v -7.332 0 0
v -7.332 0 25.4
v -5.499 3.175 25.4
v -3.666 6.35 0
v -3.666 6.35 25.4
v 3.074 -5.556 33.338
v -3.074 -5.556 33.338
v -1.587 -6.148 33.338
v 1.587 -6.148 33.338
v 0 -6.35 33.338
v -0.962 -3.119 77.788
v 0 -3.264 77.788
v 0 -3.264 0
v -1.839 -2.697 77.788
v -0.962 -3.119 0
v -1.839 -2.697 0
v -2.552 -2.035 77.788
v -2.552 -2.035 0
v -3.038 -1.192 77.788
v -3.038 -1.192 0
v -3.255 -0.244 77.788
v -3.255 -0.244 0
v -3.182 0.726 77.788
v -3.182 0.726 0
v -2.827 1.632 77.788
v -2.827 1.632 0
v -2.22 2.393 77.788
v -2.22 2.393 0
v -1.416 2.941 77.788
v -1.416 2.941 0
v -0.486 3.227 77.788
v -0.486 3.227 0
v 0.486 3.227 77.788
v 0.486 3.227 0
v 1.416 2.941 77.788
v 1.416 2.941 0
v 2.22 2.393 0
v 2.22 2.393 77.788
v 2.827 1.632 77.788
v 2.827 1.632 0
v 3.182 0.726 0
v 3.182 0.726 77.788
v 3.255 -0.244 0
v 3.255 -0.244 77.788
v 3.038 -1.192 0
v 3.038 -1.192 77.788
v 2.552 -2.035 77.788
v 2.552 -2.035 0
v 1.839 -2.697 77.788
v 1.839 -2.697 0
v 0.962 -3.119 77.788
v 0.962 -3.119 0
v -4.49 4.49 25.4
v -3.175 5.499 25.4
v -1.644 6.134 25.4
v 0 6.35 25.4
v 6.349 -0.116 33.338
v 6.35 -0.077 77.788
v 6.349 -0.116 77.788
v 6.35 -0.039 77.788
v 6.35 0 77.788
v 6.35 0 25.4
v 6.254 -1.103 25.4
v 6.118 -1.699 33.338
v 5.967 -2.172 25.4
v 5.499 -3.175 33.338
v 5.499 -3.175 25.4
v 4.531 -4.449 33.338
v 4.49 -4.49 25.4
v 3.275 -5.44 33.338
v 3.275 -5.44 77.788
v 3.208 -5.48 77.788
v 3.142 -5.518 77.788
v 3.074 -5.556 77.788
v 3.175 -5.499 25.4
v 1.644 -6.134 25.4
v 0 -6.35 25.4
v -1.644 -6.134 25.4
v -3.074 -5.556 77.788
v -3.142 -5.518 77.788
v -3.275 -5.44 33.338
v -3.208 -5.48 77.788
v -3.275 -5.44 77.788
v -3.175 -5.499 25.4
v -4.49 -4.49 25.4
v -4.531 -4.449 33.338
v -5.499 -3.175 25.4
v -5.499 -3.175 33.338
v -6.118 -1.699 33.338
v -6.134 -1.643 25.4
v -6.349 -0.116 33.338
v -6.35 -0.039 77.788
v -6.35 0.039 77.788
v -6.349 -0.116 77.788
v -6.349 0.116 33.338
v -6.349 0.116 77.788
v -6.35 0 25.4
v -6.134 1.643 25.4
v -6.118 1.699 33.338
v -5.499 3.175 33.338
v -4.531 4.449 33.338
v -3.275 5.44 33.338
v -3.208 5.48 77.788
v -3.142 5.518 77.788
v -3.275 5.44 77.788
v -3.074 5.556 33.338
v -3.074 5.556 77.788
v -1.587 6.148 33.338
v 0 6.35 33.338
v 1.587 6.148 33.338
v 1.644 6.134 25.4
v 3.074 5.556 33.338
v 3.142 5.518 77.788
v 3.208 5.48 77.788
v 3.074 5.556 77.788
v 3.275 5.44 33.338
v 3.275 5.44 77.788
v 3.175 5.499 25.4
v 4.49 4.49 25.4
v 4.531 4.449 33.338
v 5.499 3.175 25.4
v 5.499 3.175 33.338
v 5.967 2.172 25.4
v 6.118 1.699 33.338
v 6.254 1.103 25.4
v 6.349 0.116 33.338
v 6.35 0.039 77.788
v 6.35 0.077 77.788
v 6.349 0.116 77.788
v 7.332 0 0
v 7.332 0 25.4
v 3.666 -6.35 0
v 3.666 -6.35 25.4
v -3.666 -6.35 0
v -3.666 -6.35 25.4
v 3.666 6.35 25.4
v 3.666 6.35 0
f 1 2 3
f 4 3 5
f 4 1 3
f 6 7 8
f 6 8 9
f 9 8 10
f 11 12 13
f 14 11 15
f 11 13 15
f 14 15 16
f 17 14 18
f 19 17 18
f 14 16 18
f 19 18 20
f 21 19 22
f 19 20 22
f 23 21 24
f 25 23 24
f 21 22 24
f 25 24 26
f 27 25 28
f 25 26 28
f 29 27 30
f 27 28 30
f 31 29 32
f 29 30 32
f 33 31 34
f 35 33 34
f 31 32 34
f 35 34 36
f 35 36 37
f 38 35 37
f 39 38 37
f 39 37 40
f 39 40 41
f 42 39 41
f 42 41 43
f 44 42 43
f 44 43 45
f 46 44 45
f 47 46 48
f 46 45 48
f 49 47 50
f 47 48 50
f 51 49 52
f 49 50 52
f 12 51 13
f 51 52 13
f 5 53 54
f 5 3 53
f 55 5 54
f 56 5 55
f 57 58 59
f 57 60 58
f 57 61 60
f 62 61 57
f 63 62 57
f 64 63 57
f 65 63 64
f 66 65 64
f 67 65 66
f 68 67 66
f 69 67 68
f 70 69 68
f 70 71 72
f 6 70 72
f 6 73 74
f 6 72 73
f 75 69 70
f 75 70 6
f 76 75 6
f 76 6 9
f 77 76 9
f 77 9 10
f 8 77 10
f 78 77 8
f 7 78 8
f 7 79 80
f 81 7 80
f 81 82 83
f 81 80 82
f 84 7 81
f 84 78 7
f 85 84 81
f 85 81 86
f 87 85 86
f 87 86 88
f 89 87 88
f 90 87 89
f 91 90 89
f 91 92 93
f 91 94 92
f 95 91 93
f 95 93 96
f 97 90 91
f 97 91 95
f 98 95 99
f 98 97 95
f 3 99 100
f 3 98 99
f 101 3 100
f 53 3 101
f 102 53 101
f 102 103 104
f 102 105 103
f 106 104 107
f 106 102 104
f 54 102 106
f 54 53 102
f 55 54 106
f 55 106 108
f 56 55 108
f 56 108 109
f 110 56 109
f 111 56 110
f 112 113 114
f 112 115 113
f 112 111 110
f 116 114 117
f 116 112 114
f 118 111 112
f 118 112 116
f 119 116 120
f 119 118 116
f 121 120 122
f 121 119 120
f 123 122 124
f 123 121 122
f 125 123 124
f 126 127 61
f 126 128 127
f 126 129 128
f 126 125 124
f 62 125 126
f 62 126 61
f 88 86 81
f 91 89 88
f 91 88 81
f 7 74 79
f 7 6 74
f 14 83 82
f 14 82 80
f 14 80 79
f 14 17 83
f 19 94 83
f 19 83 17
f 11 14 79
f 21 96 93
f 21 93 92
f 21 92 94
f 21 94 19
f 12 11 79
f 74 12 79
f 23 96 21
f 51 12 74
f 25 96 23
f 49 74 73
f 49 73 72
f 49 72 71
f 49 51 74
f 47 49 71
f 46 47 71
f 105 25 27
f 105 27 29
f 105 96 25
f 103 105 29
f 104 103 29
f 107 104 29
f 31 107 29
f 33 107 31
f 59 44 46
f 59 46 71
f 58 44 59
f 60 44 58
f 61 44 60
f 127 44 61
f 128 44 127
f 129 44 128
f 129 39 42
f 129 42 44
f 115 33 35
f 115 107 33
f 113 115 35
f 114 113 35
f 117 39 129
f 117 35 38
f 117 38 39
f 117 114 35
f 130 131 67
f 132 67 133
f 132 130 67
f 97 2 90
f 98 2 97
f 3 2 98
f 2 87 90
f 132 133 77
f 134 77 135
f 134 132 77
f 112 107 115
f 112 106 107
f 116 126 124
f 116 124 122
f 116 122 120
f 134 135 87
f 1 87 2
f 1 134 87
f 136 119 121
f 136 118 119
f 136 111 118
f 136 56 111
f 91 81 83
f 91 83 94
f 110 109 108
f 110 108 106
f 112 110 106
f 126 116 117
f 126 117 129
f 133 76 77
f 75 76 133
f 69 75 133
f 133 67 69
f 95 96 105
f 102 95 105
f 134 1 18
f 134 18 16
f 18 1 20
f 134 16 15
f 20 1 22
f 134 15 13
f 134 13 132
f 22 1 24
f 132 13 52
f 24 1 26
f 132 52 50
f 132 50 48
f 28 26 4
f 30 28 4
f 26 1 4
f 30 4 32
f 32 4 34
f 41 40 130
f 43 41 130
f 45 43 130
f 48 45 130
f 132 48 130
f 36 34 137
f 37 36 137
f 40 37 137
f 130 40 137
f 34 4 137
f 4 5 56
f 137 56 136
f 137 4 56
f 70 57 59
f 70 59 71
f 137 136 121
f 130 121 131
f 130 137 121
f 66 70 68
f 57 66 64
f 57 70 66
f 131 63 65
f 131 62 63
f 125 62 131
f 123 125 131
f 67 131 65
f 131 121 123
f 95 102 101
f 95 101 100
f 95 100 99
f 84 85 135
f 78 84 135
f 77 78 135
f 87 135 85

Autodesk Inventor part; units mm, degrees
ref_plane "YZ Plane" through (0, 0, 0) normal (1, 0, 0) x (0, 1, 0)
ref_plane "XZ Plane" through (0, 0, 0) normal (0, 1, 0) x (-1, 0, 0)
ref_plane "XY Plane" through (0, 0, 0) normal (0, 0, 1) x (1, 0, 0)
sketch "Sketch1" plane through (0, 0, 0) normal (0, 0, 1) x (1, 0, 0)
  line L0 (-7.3323, 0) -> (-3.6662, 6.35)
  line L1 (-3.6662, 6.35) -> (3.6662, 6.35)
  line L2 (3.6662, 6.35) -> (7.3323, 0)
  line L3 (7.3323, 0) -> (3.6662, -6.35)
  line L4 (3.6662, -6.35) -> (-3.6662, -6.35)
  line L5 (-3.6662, -6.35) -> (-7.3323, 0)
  point P0 (0, 0)
  point P1 (0, 0)
  dimension "d0" = 12.7
extrude "Pulley 1/2\" Hex" add sketch "Sketch1" along normal blind 25.4
sketch "Sketch2" plane through (0, 0, 25.4) normal (0, 0, 1) x (1, 0, 0)
  circle A0 centre (0, 0) radius 6.35
extrude "External 1/2\" Round" add sketch "Sketch2" along normal blind 7.9375
sketch "Sketch3" plane through (0, 0, 33.3375) normal (0, 0, 1) x (1, 0, 0)
  circle A0 centre (0, 0) radius 6.35 projected
  line L0 (3.2748, 5.4404) -> (6.3489, 0.1158)
  line L1 (6.3489, -0.1158) -> (3.2748, -5.4404)
  line L2 (3.0742, -5.5563) -> (-3.0742, -5.5563)
  line L3 (-3.2748, -5.4404) -> (-6.3489, -0.1158)
  line L4 (-6.3489, 0.1158) -> (-3.2748, 5.4404)
  line L5 (-3.0742, 5.5563) -> (3.0742, 5.5563)
  dimension "d5" = 11.1125
extrude "Wheel 7/16\" Hex" add sketch "Sketch3" along normal blind 44.45 contours A0 L1 L2 L3 L4 L5 L0
sketch "Sketch4" plane through (0, 0, 77.7875) normal (0, 0, 1) x (1, 0, 0)
  arc A0 (-3.2748, -5.4404) -> (-3.0742, -5.5563) centre (0, 0) ccw projected
hole "Hole1" at (0, 0, 77.7875) direction (0, 0, -1) diameter 6.5278 end through all clearance for "Socket Head Cap Screw" size "1/4" standard "Ansi Unified Screw Threads"
properties part number "Center Axle" material "Aluminum 7075"
